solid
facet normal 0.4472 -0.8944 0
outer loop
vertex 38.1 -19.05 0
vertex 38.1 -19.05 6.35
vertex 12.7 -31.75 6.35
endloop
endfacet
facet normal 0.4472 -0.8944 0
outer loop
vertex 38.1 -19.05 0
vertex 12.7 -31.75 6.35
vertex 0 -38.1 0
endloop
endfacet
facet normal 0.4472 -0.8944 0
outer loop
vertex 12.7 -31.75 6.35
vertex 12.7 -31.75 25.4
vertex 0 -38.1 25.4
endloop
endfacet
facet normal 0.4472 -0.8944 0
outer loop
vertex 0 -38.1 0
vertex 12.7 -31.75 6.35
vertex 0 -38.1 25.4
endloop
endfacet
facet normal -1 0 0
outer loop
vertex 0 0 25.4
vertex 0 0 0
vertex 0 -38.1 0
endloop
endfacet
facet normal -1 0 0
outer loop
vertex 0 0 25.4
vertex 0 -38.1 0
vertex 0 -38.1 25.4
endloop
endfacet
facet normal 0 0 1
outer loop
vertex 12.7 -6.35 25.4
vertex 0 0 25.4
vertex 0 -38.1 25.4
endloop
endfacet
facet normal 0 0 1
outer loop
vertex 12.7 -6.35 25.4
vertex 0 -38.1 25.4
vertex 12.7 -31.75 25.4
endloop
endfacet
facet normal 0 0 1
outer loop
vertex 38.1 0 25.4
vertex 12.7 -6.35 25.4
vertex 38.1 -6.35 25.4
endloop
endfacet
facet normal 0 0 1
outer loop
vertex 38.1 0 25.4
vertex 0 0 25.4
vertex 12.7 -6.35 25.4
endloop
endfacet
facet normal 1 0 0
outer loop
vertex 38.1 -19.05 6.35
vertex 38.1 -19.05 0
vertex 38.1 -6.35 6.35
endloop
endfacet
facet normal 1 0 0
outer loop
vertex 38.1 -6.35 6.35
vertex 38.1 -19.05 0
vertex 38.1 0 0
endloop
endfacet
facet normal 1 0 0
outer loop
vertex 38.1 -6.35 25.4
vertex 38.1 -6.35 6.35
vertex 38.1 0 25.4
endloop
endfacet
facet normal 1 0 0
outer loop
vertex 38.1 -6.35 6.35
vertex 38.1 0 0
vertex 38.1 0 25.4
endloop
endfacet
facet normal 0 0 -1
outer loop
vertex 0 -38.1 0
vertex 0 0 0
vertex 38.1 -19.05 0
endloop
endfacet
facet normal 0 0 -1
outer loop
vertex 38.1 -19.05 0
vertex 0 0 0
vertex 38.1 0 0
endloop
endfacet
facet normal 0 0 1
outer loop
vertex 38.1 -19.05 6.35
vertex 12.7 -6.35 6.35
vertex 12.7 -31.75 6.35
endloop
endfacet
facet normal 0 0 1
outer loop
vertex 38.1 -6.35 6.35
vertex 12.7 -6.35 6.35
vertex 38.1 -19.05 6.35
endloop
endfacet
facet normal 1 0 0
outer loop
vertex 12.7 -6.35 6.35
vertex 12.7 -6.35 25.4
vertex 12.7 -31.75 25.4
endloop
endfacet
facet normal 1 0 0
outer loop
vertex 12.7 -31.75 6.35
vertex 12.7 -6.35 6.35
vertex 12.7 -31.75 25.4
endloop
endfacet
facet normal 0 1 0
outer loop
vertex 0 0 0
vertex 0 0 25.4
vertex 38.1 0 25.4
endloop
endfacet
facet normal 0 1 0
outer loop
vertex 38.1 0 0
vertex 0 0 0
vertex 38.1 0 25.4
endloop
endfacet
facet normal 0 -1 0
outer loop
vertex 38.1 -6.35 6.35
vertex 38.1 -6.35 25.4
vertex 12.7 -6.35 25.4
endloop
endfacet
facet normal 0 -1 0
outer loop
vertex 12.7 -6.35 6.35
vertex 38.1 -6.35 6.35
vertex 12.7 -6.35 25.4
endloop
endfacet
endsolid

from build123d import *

# Parameters (mm, degrees)
F0_W     = 38.1
F0_H     = 25.4
F1_DEPTH = 38.1
F3_DEPTH = 101.6
F5_DEPTH = 19.05


with BuildPart() as f1:
    # F0 (on Front) → F1 (new body)
    with BuildSketch(Plane.XZ):
        with Locations((19.05, 12.7)):
            Rectangle(F0_W, F0_H)
    extrude(amount=F1_DEPTH)

    # F2 (on face) → F3 (cut)
    with BuildSketch(Plane.XY.offset(25.4)):
        Polygon((38.1, -38.1), (38.1, -19.05), (0, -38.1), align=None)
    extrude(amount=-F3_DEPTH, mode=Mode.SUBTRACT)

    # F4 (on face) → F5 (cut)
    with BuildSketch(Plane.XY.offset(25.4)):
        Polygon((38.1, -19.05), (38.1, -6.35), (12.7, -6.35), (12.7, -31.75), align=None)
    extrude(amount=-F5_DEPTH, mode=Mode.SUBTRACT)


solid = f1.part
